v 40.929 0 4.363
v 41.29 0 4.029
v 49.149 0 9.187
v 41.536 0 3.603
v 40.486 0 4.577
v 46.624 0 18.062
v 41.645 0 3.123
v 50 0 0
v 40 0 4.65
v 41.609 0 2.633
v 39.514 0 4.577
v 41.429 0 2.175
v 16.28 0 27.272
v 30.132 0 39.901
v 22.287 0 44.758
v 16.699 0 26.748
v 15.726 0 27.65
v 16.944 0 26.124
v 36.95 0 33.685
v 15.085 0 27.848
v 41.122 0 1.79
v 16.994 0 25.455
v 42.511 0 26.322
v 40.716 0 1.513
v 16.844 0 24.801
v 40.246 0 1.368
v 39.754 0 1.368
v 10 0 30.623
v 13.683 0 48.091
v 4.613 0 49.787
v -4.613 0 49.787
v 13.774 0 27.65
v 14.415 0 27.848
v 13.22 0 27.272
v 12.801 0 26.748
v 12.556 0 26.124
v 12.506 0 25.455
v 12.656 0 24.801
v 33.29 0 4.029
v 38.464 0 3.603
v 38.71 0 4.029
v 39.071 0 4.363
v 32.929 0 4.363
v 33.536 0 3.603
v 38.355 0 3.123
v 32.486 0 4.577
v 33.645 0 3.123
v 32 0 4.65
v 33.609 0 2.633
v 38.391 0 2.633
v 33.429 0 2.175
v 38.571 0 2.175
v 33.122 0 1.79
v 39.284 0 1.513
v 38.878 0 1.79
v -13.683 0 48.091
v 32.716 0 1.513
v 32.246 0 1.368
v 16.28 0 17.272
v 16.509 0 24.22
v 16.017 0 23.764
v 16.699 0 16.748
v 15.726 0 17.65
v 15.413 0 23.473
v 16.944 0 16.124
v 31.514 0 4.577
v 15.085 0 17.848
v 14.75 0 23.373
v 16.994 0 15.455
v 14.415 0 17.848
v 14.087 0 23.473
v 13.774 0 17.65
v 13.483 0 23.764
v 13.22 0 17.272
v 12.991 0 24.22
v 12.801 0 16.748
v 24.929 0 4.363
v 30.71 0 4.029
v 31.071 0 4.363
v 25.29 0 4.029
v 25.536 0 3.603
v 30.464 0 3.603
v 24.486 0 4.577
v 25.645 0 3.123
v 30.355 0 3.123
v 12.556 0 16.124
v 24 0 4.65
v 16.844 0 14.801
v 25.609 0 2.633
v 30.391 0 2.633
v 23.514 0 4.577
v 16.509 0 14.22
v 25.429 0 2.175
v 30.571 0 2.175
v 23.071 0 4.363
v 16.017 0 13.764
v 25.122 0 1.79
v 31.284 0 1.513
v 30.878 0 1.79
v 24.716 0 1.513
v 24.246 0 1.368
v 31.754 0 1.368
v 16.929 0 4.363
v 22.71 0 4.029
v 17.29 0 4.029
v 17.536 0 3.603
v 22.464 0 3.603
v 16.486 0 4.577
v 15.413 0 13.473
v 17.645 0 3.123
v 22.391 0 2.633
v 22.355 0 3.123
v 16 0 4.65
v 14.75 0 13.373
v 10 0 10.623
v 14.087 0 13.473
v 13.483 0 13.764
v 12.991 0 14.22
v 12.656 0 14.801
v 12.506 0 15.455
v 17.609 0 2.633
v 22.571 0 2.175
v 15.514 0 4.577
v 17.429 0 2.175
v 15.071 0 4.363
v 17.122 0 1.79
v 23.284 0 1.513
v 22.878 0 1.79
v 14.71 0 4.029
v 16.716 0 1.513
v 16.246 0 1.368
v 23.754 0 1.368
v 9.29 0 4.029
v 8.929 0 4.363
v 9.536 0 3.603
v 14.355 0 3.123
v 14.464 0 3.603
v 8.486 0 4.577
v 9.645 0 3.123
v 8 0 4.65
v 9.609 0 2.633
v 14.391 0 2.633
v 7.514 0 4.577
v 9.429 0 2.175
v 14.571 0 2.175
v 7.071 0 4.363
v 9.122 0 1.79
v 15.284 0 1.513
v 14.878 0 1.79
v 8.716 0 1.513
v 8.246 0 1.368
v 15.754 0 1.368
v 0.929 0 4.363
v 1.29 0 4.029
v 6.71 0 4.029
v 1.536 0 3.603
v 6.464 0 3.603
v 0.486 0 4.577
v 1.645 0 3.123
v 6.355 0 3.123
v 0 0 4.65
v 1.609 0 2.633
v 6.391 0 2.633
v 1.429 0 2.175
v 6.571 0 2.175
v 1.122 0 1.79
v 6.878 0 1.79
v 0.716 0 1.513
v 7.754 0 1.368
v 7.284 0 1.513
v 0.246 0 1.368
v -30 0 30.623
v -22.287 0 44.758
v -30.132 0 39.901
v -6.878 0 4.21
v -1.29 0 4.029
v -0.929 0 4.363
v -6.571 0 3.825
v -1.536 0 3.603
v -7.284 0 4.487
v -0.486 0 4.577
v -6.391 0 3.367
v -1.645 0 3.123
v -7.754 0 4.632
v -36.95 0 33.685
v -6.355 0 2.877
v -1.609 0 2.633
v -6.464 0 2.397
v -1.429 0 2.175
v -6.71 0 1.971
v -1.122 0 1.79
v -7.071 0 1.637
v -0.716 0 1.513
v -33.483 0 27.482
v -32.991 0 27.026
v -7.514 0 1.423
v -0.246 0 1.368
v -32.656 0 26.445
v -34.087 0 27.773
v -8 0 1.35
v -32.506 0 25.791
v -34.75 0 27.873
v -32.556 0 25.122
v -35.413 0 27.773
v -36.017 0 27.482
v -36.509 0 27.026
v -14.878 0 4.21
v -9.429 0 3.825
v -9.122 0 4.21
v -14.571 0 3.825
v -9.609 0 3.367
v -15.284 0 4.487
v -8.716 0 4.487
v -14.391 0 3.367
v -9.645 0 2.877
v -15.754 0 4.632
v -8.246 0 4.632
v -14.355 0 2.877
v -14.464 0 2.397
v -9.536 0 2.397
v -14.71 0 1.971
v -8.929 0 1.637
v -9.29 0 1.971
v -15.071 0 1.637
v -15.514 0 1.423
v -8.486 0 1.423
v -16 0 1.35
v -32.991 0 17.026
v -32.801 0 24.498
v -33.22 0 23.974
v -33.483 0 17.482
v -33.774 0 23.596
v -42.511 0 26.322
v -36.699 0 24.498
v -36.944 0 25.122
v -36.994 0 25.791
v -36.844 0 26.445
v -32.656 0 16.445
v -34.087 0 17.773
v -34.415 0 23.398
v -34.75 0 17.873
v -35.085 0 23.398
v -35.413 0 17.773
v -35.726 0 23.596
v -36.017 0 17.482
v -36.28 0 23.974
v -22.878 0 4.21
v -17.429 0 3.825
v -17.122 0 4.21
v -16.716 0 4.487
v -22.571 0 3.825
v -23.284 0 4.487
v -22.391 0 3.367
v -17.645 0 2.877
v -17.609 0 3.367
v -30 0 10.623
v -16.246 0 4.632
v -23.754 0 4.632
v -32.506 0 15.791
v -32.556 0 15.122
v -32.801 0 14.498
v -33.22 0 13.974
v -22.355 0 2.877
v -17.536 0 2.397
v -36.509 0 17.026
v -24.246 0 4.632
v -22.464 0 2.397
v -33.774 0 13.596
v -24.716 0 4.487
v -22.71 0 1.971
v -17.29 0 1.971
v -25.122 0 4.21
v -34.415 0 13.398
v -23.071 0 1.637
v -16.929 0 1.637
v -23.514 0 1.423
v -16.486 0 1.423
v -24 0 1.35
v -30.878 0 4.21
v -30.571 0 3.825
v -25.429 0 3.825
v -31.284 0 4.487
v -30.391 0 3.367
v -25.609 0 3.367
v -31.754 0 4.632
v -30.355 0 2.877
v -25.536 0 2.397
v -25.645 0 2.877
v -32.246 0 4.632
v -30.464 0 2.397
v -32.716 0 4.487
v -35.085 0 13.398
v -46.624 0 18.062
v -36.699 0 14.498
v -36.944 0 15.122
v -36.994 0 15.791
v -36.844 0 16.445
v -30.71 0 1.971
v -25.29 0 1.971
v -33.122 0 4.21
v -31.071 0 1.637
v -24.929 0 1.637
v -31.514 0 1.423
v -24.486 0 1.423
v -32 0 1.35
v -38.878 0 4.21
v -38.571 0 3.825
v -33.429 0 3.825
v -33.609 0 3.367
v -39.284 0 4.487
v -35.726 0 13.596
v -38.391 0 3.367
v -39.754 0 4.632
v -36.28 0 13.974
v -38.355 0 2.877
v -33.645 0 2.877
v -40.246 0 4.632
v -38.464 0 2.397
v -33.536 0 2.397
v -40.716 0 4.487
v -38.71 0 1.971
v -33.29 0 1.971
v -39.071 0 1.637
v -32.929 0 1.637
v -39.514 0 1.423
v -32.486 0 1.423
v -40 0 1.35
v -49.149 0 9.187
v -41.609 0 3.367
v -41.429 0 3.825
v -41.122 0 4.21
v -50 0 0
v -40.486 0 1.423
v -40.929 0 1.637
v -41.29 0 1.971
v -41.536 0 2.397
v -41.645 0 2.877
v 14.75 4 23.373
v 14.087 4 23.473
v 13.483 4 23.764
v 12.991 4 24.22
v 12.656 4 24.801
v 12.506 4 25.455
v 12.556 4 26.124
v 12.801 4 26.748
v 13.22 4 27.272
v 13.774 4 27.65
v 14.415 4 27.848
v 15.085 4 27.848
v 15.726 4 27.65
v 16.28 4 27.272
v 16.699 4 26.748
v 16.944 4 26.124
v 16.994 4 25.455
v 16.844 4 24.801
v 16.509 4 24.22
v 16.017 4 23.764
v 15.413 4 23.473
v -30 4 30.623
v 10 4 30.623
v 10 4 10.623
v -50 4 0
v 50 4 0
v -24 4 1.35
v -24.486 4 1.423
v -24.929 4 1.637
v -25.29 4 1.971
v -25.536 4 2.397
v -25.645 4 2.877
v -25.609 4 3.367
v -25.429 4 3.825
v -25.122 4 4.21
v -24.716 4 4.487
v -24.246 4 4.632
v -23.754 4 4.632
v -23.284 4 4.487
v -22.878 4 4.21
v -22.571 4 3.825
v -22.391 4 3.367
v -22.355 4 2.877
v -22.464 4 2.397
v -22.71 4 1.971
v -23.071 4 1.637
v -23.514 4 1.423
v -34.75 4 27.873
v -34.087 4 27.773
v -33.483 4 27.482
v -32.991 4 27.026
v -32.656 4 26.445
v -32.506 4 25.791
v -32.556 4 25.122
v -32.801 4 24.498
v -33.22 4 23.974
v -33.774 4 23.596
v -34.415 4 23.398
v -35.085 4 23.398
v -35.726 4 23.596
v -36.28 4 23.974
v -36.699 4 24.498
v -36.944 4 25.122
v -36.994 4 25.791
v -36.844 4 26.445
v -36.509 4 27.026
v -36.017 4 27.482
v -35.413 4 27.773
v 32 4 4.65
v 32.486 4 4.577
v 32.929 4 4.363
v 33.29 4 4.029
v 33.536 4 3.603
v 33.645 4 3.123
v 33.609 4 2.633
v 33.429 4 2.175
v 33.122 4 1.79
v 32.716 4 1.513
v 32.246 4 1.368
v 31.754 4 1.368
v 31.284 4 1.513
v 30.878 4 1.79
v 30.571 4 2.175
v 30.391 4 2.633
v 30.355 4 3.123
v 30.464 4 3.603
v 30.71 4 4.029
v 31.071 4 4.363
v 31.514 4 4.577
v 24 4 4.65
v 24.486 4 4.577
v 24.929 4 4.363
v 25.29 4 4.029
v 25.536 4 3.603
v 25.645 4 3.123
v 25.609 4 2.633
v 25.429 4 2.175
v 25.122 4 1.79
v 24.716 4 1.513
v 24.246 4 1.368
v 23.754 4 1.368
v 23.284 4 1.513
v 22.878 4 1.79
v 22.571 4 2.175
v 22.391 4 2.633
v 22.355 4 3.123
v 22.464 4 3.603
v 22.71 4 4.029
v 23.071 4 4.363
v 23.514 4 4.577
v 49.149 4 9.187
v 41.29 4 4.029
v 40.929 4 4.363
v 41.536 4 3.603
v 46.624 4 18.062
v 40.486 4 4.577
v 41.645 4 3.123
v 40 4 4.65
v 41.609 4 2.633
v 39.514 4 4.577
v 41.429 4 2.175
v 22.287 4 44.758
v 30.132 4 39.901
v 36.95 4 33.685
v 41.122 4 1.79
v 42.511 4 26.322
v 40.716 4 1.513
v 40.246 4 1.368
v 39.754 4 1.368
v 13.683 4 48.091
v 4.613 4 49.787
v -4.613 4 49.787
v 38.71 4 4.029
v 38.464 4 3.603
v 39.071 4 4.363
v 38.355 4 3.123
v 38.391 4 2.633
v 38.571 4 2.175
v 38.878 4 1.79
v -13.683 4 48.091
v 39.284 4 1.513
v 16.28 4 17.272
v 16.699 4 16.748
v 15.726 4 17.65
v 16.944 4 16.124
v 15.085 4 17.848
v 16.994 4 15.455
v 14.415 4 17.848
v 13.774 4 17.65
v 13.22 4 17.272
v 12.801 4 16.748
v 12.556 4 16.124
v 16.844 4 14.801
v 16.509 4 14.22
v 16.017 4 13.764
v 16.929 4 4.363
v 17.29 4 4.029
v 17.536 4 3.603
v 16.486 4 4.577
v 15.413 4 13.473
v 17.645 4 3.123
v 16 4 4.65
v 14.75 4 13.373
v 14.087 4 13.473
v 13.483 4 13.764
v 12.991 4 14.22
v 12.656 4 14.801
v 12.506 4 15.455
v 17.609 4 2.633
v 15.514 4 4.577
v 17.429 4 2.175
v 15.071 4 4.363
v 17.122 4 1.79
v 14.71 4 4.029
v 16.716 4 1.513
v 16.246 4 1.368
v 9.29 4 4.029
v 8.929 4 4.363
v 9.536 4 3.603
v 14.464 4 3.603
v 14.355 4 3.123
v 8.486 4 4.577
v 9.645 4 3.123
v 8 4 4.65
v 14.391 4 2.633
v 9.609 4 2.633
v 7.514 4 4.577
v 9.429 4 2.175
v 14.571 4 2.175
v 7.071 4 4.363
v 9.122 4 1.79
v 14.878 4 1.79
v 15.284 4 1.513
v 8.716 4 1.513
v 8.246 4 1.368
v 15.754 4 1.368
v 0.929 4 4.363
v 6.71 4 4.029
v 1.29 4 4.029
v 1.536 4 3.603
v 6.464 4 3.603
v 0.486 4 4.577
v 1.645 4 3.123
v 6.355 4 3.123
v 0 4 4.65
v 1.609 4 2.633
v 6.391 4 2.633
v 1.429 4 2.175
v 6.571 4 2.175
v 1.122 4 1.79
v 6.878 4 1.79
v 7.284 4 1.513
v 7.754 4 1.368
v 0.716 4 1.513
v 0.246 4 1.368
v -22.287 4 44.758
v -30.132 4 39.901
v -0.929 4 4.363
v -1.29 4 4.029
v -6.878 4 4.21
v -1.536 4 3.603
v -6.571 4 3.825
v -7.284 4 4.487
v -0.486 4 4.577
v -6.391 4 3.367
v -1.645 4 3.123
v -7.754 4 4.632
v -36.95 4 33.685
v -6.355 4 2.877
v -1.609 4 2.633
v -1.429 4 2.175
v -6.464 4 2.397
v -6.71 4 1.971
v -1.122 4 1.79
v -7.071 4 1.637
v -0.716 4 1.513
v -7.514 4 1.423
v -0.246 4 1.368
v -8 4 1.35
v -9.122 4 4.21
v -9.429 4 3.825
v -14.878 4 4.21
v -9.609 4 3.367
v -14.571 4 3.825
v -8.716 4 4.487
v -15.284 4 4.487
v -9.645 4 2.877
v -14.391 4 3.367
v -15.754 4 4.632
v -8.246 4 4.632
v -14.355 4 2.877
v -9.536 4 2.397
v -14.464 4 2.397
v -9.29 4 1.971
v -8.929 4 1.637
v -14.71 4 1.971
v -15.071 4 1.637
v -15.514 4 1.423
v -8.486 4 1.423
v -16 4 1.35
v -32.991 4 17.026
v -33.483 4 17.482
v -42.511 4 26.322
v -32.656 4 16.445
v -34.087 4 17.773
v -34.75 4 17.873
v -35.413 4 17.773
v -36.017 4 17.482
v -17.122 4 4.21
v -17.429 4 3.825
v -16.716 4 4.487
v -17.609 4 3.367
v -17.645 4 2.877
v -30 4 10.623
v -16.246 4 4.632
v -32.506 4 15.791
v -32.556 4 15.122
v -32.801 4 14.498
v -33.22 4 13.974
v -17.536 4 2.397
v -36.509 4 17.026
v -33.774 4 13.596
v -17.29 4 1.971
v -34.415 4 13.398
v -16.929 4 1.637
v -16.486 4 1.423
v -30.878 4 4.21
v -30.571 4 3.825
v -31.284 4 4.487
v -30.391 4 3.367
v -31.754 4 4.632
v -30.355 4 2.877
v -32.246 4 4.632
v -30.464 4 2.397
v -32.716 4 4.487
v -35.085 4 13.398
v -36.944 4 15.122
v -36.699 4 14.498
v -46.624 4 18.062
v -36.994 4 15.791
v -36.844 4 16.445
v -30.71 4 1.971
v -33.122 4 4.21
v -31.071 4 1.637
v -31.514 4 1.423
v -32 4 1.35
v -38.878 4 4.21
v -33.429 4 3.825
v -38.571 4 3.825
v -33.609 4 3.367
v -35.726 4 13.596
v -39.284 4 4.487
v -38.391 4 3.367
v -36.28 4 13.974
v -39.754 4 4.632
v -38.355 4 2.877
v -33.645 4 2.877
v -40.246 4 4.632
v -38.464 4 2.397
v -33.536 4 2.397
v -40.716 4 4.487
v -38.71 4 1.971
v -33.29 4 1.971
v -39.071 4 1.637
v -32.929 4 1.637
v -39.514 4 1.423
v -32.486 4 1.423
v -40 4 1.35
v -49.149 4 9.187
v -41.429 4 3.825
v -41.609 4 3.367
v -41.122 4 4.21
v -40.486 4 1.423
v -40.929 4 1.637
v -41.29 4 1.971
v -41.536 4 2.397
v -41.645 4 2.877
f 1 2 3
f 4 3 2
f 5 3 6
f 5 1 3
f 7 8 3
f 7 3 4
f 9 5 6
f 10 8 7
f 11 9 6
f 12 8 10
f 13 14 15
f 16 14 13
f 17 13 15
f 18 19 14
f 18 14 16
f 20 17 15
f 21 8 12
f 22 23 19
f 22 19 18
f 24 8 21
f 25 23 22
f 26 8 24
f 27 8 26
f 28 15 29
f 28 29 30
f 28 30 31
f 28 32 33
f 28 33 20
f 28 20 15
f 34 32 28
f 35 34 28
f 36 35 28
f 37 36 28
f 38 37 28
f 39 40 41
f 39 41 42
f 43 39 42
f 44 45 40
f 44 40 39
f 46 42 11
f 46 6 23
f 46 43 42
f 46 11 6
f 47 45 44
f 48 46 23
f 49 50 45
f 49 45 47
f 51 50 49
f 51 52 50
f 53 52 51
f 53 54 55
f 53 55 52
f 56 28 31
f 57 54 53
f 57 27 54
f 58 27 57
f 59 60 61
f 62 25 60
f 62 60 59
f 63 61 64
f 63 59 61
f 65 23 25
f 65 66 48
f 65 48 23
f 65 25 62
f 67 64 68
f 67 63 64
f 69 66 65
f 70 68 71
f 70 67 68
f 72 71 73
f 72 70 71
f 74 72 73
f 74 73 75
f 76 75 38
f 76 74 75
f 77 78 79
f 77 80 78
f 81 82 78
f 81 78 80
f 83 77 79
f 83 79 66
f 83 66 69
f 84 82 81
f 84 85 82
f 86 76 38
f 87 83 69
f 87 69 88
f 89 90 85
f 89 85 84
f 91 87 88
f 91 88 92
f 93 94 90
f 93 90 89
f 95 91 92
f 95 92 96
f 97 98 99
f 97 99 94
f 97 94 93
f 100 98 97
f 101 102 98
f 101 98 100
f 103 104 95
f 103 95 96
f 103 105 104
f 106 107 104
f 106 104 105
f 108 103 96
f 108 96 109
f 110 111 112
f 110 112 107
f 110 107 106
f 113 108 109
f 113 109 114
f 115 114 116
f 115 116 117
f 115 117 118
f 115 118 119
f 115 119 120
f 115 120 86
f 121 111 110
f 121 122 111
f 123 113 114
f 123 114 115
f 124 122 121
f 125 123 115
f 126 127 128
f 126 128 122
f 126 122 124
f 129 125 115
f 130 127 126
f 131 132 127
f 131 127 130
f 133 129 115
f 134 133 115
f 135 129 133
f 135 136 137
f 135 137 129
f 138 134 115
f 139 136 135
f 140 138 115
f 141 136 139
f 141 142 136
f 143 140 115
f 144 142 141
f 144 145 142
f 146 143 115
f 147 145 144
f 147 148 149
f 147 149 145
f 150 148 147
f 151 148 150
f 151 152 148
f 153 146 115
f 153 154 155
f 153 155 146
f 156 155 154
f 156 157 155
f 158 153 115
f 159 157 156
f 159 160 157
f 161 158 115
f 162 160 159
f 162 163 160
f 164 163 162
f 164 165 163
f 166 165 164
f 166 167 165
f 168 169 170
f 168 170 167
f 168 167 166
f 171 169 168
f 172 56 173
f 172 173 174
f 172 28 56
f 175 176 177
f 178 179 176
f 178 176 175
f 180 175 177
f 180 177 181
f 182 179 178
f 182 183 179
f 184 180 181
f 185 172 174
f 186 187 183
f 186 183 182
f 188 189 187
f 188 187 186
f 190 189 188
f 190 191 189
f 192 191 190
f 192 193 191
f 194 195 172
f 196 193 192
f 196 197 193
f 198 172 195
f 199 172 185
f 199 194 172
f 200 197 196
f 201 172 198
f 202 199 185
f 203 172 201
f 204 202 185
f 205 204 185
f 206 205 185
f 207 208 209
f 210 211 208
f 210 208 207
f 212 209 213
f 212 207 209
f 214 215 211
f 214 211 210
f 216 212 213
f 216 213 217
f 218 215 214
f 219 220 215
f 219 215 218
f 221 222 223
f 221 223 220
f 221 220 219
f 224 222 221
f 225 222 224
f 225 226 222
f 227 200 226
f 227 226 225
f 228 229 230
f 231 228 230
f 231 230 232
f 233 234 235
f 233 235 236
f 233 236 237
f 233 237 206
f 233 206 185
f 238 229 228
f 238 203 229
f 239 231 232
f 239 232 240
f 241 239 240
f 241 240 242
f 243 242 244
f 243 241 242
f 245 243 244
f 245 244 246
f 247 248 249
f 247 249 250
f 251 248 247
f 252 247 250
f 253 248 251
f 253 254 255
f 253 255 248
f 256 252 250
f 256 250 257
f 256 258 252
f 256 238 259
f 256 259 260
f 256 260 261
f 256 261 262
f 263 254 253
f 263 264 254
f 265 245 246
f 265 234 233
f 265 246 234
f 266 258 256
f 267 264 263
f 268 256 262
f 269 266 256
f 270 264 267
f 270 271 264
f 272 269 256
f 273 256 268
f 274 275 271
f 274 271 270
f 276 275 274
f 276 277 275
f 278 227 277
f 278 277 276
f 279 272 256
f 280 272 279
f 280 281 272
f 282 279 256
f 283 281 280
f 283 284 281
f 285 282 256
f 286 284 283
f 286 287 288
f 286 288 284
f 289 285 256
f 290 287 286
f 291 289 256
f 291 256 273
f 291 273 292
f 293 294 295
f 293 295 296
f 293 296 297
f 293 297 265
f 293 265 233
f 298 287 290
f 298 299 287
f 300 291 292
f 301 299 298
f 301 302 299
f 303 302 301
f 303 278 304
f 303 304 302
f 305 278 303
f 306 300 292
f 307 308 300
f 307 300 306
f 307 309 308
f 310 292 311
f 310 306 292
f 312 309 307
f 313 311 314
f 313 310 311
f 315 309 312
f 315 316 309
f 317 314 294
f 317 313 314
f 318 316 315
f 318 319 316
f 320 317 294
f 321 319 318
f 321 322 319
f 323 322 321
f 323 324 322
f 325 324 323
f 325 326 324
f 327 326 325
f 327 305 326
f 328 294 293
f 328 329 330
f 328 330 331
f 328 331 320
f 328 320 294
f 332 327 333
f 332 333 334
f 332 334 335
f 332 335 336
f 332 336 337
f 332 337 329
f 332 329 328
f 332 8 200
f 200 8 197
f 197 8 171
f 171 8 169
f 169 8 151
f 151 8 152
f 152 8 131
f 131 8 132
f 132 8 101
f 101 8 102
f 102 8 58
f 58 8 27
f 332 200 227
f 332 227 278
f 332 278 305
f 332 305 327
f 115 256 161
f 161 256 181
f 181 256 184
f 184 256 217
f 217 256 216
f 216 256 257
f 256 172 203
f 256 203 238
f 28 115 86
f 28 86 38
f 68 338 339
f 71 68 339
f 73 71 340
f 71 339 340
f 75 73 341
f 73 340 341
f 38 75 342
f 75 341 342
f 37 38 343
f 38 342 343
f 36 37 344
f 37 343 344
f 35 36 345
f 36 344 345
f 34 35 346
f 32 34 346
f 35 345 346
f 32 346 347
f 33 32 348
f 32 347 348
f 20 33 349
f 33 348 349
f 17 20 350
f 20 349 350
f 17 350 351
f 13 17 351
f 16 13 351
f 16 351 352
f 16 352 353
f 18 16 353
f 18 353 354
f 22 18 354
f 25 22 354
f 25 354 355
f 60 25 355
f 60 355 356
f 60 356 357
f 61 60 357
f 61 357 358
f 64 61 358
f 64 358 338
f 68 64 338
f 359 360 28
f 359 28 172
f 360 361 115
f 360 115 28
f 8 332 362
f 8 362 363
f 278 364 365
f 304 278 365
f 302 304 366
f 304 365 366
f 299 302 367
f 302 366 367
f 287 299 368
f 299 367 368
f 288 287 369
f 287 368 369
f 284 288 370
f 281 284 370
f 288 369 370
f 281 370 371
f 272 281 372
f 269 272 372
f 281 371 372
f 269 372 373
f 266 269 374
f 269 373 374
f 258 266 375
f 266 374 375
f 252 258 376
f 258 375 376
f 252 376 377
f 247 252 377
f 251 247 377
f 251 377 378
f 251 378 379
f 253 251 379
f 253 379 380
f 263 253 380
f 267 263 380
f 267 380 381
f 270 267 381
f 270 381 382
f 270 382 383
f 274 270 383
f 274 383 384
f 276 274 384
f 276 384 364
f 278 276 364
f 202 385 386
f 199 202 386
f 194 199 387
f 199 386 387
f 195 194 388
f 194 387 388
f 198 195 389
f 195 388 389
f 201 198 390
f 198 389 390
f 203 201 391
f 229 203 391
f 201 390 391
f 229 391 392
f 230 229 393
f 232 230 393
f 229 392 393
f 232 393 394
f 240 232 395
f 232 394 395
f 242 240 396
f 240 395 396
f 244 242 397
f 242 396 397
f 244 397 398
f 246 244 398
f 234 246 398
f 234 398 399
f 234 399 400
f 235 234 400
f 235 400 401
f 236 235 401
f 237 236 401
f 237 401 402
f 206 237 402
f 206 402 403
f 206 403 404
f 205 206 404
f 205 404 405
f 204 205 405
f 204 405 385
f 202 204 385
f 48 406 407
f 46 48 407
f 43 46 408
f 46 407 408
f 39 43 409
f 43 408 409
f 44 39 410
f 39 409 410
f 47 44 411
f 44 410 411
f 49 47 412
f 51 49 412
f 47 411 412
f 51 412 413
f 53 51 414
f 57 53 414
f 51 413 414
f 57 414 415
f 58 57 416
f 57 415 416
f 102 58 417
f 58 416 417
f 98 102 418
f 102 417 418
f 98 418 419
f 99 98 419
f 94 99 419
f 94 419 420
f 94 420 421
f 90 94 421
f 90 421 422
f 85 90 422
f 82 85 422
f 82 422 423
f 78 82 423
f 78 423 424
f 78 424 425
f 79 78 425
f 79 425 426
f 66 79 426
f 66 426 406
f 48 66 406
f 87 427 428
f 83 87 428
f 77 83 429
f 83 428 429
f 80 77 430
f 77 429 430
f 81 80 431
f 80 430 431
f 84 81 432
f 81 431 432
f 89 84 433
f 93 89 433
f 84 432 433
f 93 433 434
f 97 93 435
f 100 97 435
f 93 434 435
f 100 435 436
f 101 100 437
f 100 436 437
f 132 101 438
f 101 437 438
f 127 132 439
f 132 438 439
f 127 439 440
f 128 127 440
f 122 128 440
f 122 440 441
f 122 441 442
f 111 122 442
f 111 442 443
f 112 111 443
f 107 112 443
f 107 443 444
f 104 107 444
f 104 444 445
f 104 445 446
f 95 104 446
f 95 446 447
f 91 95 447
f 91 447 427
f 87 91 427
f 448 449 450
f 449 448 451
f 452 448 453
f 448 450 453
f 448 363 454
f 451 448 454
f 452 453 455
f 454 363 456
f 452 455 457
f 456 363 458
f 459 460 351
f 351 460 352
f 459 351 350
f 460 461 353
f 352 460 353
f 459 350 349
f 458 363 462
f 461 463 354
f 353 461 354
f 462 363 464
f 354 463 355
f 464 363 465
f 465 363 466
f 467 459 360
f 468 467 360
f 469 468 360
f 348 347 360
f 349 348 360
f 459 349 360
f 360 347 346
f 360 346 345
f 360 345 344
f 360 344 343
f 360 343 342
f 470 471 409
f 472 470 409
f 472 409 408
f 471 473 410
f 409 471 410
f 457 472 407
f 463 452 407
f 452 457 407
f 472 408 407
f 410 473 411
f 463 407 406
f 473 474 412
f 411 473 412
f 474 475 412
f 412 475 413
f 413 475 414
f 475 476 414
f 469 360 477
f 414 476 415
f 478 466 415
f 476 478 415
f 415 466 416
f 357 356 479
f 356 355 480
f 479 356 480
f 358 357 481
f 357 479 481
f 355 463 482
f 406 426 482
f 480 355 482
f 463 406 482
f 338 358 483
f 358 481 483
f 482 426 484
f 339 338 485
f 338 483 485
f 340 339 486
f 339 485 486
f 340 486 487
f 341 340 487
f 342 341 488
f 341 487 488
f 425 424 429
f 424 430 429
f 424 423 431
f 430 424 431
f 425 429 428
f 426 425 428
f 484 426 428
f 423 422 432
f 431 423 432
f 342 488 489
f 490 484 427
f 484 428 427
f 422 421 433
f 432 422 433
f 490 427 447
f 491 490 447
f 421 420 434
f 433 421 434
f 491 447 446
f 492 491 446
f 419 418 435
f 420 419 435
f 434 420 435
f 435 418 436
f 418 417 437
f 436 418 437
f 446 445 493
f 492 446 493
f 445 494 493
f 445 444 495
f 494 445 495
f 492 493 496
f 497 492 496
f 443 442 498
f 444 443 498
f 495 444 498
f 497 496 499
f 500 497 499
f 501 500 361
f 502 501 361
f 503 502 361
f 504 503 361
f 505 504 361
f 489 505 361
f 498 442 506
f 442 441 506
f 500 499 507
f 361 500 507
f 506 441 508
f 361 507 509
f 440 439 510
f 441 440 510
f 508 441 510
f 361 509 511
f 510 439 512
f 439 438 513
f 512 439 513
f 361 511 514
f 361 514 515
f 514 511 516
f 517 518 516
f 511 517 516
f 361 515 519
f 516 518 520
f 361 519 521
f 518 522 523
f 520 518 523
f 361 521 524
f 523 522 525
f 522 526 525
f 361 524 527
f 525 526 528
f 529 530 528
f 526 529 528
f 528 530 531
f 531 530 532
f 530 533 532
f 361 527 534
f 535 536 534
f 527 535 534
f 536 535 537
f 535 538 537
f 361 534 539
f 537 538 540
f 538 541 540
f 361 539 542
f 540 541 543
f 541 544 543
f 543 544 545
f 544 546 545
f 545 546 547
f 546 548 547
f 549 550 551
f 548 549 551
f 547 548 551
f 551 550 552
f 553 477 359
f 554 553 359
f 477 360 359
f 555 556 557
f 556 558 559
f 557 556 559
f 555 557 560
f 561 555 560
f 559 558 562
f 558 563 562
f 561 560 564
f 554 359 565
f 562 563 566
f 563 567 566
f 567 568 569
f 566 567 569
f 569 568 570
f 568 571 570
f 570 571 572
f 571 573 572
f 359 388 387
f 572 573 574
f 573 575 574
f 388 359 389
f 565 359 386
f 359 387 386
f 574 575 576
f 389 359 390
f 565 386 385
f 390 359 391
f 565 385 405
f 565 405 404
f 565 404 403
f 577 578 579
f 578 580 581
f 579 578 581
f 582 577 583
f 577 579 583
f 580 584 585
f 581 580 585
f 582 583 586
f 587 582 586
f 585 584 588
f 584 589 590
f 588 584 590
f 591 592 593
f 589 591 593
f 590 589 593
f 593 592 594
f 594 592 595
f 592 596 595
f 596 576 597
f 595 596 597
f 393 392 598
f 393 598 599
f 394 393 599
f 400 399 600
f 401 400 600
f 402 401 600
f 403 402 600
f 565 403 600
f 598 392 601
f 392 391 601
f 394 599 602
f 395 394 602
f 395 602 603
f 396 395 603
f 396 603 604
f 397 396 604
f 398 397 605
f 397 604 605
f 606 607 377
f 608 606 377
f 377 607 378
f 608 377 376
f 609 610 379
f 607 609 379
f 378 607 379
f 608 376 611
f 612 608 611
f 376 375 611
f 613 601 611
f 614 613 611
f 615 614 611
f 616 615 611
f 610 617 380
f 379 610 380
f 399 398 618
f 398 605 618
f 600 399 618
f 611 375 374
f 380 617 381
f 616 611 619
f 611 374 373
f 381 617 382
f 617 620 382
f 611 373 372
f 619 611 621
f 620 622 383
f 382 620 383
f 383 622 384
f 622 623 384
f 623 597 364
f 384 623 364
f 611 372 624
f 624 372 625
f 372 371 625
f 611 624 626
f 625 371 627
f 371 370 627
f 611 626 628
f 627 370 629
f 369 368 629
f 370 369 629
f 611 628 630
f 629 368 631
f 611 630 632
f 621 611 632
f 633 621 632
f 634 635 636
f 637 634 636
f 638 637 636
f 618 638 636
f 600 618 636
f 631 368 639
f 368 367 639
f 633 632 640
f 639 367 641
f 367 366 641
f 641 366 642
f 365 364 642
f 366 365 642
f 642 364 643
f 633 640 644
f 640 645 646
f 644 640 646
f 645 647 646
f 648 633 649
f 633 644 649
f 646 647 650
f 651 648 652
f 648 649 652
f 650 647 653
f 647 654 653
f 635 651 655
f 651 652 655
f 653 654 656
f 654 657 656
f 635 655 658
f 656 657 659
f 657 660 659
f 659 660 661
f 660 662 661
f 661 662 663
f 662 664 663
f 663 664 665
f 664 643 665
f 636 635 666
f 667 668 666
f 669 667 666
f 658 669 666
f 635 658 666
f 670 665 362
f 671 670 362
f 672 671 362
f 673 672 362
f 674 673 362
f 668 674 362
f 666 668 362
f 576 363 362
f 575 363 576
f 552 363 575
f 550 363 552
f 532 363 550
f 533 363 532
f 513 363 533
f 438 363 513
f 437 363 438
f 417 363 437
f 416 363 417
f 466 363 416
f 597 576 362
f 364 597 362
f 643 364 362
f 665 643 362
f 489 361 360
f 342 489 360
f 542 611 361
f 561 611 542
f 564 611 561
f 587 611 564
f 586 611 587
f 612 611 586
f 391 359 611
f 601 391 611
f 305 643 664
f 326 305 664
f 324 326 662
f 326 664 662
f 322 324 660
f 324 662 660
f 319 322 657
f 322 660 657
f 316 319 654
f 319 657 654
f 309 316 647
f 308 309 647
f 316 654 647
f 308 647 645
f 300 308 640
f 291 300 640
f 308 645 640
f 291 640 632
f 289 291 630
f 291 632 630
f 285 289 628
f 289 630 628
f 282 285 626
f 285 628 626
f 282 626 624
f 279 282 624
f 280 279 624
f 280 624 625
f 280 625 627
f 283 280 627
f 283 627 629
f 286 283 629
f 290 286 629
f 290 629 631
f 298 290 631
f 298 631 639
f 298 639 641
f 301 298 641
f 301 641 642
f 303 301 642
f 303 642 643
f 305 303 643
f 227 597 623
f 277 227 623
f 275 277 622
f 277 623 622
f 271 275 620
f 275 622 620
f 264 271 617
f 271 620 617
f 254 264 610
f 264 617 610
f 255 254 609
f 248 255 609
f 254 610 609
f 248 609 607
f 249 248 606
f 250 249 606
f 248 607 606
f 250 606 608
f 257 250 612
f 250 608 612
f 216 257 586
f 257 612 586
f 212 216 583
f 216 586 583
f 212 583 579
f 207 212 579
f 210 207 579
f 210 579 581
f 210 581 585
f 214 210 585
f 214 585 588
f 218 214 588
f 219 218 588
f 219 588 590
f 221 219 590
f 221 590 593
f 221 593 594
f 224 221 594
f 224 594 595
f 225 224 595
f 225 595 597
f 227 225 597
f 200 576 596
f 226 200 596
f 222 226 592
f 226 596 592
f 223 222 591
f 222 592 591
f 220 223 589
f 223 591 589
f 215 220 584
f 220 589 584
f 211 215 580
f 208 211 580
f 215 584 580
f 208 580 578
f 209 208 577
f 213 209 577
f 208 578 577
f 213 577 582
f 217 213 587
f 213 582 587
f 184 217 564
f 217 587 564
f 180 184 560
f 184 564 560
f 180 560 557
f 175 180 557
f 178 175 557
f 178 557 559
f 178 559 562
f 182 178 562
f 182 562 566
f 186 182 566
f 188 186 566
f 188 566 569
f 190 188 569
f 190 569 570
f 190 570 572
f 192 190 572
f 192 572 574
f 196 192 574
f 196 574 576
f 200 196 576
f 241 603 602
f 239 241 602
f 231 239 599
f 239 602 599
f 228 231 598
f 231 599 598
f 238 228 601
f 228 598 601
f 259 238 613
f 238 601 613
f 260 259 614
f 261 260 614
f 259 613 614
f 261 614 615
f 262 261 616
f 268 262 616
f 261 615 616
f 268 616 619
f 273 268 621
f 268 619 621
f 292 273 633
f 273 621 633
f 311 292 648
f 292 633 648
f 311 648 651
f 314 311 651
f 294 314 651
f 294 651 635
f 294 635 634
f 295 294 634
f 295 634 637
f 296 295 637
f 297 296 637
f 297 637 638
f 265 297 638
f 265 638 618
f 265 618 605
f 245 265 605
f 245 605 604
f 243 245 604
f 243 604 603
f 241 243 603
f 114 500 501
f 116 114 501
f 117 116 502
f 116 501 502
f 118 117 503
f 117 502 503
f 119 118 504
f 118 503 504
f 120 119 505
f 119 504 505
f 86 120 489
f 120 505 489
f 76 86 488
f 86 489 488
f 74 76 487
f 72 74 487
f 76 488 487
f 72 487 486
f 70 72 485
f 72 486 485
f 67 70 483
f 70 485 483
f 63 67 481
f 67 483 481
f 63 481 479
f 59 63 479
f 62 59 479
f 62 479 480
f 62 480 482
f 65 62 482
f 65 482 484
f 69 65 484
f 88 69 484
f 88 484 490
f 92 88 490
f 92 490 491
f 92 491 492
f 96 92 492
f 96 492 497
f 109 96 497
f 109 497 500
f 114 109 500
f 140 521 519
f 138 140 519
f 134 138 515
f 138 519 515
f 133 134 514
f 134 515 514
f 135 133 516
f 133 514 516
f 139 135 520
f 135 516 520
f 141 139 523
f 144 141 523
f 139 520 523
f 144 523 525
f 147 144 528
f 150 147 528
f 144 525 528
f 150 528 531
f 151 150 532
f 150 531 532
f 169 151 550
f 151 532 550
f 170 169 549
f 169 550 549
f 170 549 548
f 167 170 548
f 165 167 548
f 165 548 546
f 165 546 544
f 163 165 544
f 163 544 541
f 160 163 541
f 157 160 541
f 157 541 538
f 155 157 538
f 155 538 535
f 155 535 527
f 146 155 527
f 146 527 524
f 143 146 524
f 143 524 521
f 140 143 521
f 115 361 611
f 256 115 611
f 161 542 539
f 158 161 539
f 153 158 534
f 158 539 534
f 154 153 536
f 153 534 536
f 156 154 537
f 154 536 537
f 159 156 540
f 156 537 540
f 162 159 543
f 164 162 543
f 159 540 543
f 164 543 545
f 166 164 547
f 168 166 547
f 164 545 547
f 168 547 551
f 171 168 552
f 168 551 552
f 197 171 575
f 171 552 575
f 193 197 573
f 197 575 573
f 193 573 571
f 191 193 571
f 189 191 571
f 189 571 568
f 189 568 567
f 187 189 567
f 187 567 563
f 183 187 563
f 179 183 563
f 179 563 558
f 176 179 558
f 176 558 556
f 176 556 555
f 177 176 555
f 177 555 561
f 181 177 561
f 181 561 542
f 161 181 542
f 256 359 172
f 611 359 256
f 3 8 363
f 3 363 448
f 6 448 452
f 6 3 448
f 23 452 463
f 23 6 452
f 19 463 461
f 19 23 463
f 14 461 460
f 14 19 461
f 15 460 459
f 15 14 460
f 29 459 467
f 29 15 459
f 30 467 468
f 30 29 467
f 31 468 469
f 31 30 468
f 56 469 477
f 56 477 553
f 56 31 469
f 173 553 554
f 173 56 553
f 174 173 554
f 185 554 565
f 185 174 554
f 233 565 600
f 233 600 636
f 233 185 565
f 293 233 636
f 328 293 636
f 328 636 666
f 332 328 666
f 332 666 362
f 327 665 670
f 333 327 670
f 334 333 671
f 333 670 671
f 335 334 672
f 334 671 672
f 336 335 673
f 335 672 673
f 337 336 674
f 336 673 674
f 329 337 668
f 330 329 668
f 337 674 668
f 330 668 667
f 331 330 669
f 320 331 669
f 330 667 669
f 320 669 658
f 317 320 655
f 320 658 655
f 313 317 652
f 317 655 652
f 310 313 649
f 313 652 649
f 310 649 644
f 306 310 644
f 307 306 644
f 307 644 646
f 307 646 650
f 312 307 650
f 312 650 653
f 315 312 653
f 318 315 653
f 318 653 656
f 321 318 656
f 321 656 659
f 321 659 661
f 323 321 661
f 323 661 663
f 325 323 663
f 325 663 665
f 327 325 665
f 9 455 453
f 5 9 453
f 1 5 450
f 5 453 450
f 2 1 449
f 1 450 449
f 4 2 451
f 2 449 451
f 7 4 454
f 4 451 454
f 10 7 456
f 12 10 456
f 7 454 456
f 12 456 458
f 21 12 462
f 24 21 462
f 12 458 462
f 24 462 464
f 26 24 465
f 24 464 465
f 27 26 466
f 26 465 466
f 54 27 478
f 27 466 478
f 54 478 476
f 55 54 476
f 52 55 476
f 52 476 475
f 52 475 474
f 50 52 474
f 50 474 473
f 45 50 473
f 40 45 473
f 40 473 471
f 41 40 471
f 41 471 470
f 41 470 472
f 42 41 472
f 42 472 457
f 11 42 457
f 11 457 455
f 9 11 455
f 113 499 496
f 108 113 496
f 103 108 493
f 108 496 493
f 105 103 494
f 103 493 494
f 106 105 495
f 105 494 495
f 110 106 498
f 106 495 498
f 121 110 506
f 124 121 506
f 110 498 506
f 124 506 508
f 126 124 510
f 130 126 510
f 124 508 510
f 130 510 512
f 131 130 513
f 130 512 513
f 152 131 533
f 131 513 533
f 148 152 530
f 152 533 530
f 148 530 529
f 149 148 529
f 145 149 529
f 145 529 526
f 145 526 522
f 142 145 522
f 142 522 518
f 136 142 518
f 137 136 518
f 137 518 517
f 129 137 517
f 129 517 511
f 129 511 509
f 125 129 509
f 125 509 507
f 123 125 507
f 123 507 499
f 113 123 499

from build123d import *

# Parameters (mm, degrees)
EXTRUDE_1_DEPTH     = 4
CUT_EXTRUDE_1_DEPTH = 10
SKETCH_3_R          = 2.25
CUT_EXTRUDE_2_DEPTH = 10
SKETCH_4_R          = 1.65
CUT_EXTRUDE_3_DEPTH = 10


with BuildPart() as part:
    # 草图1 → 凸台-拉伸1 (new body)
    with BuildSketch(Plane(origin=(0, 0, 0), x_dir=(1, 0, 0), z_dir=(0, 1, 0))):
        with BuildLine():
            Line((-50, 0), (50, 0))
            ThreePointArc((50, 0), (0, -50), (-50, 0))
        make_face()
    extrude(amount=EXTRUDE_1_DEPTH)

    # 草图2 → 切除-拉伸1 (cut)
    with BuildSketch(Plane(origin=(0, 4, 0), x_dir=(1, 0, 0), z_dir=(0, 1, 0))):
        Polygon((0, -10.623043888), (10, -10.623043888), (10, -30.623043888), (-30, -30.623043888), (-30, -10.623043888), align=None)
    extrude(amount=-CUT_EXTRUDE_1_DEPTH, mode=Mode.SUBTRACT)

    # 草图3 → 切除-拉伸2 (cut)
    with BuildSketch(Plane(origin=(0, 4, 0), x_dir=(1, 0, 0), z_dir=(0, 1, 0))):
        with Locations(Location((-34.75, -15.623043888, 0), (0, 0, 270))):
            Circle(SKETCH_3_R)
        with Locations(Location((-34.75, -25.623043888, 0), (0, 0, 270))):
            Circle(SKETCH_3_R)
        with Locations(Location((14.75, -25.623043888, 0), (0, 0, 90))):
            Circle(SKETCH_3_R)
        with Locations(Location((14.75, -15.623043888, 0), (0, 0, 90))):
            Circle(SKETCH_3_R)
    extrude(amount=-CUT_EXTRUDE_2_DEPTH, mode=Mode.SUBTRACT)

    # 草图4 → 切除-拉伸3 (cut)
    with BuildSketch(Plane(origin=(0, 4, 0), x_dir=(1, 0, 0), z_dir=(0, 1, 0))):
        with Locations(Location((0, -3, 0), (0, 0, 270))):
            Circle(SKETCH_4_R)
        with Locations(Location((8, -3, 0), (0, 0, 270))):
            Circle(SKETCH_4_R)
        with Locations(Location((16, -3, 0), (0, 0, 270))):
            Circle(SKETCH_4_R)
        with Locations(Location((24, -3, 0), (0, 0, 270))):
            Circle(SKETCH_4_R)
        with Locations(Location((32, -3, 0), (0, 0, 270))):
            Circle(SKETCH_4_R)
        with Locations(Location((40, -3, 0), (0, 0, 270))):
            Circle(SKETCH_4_R)
        with Locations(Location((-40, -3, 0), (0, 0, 90))):
            Circle(SKETCH_4_R)
        with Locations(Location((-32, -3, 0), (0, 0, 90))):
            Circle(SKETCH_4_R)
        with Locations(Location((-24, -3, 0), (0, 0, 90))):
            Circle(SKETCH_4_R)
        with Locations(Location((-16, -3, 0), (0, 0, 90))):
            Circle(SKETCH_4_R)
        with Locations(Location((-8, -3, 0), (0, 0, 90))):
            Circle(SKETCH_4_R)
    extrude(amount=-CUT_EXTRUDE_3_DEPTH, mode=Mode.SUBTRACT)


solid = part.part
